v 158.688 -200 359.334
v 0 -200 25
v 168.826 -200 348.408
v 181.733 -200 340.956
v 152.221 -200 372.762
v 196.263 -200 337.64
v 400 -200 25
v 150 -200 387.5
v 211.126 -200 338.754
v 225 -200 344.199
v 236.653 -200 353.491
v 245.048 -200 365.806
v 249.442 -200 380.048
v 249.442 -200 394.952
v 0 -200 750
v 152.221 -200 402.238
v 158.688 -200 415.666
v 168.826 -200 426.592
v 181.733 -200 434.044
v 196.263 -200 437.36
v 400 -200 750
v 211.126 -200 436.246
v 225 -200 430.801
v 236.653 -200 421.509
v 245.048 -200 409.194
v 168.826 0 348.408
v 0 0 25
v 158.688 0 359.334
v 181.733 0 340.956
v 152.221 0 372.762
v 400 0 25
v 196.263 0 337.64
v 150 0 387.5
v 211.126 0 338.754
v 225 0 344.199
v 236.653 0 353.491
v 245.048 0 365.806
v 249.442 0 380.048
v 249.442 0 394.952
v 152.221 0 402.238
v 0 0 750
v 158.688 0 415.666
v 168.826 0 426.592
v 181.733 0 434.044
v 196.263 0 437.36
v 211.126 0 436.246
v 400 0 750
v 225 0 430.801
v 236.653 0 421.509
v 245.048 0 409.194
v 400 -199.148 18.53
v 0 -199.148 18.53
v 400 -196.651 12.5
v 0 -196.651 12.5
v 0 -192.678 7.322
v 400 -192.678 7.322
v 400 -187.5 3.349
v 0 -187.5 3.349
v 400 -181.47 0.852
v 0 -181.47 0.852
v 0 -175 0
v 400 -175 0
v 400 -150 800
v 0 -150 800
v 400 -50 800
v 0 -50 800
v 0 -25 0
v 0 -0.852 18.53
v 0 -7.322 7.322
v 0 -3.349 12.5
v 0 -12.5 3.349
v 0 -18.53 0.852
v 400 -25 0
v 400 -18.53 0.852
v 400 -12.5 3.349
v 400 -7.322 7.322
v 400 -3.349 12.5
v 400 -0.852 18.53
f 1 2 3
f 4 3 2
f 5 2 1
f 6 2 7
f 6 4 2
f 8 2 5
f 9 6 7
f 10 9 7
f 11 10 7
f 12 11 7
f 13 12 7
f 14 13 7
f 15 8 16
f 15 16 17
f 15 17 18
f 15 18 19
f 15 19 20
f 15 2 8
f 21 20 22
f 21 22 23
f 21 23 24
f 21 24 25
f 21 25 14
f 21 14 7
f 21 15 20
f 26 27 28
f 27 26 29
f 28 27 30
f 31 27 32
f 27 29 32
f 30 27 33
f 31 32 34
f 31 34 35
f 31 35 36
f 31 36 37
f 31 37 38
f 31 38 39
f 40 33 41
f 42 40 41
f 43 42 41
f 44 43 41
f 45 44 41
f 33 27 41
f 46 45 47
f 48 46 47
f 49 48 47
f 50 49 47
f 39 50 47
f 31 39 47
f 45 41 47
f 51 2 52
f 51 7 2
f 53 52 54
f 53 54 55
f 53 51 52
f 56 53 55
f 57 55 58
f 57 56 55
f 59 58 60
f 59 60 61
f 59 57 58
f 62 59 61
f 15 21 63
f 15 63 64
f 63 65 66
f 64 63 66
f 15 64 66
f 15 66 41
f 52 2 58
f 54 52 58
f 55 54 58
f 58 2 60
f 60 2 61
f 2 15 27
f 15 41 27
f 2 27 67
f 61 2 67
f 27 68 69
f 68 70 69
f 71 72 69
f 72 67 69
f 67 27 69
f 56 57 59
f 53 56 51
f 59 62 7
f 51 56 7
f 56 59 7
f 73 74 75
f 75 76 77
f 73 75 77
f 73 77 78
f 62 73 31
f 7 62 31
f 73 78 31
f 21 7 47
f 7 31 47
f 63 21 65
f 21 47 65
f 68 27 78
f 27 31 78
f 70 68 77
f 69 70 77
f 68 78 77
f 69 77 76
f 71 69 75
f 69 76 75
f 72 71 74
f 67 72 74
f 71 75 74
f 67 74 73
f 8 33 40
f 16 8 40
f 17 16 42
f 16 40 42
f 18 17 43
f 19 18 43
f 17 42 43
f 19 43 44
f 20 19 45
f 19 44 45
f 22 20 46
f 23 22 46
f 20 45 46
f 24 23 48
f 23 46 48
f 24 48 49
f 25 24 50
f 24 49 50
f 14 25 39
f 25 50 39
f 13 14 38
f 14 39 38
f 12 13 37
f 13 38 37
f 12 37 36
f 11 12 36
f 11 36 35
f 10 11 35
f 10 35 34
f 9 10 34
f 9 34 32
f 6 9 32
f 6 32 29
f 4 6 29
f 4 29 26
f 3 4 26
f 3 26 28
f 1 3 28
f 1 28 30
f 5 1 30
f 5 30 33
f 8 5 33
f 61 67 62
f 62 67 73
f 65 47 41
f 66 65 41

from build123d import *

# Parameters (mm, degrees)
F0_W     = 1.1063814163
F0_H     = 17.7862383425
F1_DEPTH = 200
F2_SIZE  = 50
F3_R     = 25
F5_D     = 100


with BuildPart() as f1:
    # F0 (on Front) → F1 (new body)
    with BuildSketch(Plane.XZ):
        with Locations((170.4081445932, 8.8931191713)):
            Rectangle(F0_W, F0_H)
        Polygon((0, 800), (0, 0), (169.8549538851, 0), (169.8549538851, 17.7862383425), (170.9613353014, 17.7862383425), (170.9613353014, 0), (400, 0), (400, 800), align=None)
    extrude(amount=F1_DEPTH)

    # F2
    f2_edges = [f1.edges().sort_by_distance(p)[0] for p in [
        (200, -200, 800),
        (200, 0, 800),
    ]]
    chamfer(f2_edges, length=F2_SIZE)

    # F3
    f3_edges = [f1.edges().sort_by_distance(p)[0] for p in [
        (200, -200, 0),
        (200, 0, 0),
    ]]
    fillet(f3_edges, radius=F3_R)

    # F5 (through all)
    with Locations(Plane.XZ.offset(200)):
        with Locations((200, 387.5)):
            Hole(F5_D / 2)


solid = f1.part
